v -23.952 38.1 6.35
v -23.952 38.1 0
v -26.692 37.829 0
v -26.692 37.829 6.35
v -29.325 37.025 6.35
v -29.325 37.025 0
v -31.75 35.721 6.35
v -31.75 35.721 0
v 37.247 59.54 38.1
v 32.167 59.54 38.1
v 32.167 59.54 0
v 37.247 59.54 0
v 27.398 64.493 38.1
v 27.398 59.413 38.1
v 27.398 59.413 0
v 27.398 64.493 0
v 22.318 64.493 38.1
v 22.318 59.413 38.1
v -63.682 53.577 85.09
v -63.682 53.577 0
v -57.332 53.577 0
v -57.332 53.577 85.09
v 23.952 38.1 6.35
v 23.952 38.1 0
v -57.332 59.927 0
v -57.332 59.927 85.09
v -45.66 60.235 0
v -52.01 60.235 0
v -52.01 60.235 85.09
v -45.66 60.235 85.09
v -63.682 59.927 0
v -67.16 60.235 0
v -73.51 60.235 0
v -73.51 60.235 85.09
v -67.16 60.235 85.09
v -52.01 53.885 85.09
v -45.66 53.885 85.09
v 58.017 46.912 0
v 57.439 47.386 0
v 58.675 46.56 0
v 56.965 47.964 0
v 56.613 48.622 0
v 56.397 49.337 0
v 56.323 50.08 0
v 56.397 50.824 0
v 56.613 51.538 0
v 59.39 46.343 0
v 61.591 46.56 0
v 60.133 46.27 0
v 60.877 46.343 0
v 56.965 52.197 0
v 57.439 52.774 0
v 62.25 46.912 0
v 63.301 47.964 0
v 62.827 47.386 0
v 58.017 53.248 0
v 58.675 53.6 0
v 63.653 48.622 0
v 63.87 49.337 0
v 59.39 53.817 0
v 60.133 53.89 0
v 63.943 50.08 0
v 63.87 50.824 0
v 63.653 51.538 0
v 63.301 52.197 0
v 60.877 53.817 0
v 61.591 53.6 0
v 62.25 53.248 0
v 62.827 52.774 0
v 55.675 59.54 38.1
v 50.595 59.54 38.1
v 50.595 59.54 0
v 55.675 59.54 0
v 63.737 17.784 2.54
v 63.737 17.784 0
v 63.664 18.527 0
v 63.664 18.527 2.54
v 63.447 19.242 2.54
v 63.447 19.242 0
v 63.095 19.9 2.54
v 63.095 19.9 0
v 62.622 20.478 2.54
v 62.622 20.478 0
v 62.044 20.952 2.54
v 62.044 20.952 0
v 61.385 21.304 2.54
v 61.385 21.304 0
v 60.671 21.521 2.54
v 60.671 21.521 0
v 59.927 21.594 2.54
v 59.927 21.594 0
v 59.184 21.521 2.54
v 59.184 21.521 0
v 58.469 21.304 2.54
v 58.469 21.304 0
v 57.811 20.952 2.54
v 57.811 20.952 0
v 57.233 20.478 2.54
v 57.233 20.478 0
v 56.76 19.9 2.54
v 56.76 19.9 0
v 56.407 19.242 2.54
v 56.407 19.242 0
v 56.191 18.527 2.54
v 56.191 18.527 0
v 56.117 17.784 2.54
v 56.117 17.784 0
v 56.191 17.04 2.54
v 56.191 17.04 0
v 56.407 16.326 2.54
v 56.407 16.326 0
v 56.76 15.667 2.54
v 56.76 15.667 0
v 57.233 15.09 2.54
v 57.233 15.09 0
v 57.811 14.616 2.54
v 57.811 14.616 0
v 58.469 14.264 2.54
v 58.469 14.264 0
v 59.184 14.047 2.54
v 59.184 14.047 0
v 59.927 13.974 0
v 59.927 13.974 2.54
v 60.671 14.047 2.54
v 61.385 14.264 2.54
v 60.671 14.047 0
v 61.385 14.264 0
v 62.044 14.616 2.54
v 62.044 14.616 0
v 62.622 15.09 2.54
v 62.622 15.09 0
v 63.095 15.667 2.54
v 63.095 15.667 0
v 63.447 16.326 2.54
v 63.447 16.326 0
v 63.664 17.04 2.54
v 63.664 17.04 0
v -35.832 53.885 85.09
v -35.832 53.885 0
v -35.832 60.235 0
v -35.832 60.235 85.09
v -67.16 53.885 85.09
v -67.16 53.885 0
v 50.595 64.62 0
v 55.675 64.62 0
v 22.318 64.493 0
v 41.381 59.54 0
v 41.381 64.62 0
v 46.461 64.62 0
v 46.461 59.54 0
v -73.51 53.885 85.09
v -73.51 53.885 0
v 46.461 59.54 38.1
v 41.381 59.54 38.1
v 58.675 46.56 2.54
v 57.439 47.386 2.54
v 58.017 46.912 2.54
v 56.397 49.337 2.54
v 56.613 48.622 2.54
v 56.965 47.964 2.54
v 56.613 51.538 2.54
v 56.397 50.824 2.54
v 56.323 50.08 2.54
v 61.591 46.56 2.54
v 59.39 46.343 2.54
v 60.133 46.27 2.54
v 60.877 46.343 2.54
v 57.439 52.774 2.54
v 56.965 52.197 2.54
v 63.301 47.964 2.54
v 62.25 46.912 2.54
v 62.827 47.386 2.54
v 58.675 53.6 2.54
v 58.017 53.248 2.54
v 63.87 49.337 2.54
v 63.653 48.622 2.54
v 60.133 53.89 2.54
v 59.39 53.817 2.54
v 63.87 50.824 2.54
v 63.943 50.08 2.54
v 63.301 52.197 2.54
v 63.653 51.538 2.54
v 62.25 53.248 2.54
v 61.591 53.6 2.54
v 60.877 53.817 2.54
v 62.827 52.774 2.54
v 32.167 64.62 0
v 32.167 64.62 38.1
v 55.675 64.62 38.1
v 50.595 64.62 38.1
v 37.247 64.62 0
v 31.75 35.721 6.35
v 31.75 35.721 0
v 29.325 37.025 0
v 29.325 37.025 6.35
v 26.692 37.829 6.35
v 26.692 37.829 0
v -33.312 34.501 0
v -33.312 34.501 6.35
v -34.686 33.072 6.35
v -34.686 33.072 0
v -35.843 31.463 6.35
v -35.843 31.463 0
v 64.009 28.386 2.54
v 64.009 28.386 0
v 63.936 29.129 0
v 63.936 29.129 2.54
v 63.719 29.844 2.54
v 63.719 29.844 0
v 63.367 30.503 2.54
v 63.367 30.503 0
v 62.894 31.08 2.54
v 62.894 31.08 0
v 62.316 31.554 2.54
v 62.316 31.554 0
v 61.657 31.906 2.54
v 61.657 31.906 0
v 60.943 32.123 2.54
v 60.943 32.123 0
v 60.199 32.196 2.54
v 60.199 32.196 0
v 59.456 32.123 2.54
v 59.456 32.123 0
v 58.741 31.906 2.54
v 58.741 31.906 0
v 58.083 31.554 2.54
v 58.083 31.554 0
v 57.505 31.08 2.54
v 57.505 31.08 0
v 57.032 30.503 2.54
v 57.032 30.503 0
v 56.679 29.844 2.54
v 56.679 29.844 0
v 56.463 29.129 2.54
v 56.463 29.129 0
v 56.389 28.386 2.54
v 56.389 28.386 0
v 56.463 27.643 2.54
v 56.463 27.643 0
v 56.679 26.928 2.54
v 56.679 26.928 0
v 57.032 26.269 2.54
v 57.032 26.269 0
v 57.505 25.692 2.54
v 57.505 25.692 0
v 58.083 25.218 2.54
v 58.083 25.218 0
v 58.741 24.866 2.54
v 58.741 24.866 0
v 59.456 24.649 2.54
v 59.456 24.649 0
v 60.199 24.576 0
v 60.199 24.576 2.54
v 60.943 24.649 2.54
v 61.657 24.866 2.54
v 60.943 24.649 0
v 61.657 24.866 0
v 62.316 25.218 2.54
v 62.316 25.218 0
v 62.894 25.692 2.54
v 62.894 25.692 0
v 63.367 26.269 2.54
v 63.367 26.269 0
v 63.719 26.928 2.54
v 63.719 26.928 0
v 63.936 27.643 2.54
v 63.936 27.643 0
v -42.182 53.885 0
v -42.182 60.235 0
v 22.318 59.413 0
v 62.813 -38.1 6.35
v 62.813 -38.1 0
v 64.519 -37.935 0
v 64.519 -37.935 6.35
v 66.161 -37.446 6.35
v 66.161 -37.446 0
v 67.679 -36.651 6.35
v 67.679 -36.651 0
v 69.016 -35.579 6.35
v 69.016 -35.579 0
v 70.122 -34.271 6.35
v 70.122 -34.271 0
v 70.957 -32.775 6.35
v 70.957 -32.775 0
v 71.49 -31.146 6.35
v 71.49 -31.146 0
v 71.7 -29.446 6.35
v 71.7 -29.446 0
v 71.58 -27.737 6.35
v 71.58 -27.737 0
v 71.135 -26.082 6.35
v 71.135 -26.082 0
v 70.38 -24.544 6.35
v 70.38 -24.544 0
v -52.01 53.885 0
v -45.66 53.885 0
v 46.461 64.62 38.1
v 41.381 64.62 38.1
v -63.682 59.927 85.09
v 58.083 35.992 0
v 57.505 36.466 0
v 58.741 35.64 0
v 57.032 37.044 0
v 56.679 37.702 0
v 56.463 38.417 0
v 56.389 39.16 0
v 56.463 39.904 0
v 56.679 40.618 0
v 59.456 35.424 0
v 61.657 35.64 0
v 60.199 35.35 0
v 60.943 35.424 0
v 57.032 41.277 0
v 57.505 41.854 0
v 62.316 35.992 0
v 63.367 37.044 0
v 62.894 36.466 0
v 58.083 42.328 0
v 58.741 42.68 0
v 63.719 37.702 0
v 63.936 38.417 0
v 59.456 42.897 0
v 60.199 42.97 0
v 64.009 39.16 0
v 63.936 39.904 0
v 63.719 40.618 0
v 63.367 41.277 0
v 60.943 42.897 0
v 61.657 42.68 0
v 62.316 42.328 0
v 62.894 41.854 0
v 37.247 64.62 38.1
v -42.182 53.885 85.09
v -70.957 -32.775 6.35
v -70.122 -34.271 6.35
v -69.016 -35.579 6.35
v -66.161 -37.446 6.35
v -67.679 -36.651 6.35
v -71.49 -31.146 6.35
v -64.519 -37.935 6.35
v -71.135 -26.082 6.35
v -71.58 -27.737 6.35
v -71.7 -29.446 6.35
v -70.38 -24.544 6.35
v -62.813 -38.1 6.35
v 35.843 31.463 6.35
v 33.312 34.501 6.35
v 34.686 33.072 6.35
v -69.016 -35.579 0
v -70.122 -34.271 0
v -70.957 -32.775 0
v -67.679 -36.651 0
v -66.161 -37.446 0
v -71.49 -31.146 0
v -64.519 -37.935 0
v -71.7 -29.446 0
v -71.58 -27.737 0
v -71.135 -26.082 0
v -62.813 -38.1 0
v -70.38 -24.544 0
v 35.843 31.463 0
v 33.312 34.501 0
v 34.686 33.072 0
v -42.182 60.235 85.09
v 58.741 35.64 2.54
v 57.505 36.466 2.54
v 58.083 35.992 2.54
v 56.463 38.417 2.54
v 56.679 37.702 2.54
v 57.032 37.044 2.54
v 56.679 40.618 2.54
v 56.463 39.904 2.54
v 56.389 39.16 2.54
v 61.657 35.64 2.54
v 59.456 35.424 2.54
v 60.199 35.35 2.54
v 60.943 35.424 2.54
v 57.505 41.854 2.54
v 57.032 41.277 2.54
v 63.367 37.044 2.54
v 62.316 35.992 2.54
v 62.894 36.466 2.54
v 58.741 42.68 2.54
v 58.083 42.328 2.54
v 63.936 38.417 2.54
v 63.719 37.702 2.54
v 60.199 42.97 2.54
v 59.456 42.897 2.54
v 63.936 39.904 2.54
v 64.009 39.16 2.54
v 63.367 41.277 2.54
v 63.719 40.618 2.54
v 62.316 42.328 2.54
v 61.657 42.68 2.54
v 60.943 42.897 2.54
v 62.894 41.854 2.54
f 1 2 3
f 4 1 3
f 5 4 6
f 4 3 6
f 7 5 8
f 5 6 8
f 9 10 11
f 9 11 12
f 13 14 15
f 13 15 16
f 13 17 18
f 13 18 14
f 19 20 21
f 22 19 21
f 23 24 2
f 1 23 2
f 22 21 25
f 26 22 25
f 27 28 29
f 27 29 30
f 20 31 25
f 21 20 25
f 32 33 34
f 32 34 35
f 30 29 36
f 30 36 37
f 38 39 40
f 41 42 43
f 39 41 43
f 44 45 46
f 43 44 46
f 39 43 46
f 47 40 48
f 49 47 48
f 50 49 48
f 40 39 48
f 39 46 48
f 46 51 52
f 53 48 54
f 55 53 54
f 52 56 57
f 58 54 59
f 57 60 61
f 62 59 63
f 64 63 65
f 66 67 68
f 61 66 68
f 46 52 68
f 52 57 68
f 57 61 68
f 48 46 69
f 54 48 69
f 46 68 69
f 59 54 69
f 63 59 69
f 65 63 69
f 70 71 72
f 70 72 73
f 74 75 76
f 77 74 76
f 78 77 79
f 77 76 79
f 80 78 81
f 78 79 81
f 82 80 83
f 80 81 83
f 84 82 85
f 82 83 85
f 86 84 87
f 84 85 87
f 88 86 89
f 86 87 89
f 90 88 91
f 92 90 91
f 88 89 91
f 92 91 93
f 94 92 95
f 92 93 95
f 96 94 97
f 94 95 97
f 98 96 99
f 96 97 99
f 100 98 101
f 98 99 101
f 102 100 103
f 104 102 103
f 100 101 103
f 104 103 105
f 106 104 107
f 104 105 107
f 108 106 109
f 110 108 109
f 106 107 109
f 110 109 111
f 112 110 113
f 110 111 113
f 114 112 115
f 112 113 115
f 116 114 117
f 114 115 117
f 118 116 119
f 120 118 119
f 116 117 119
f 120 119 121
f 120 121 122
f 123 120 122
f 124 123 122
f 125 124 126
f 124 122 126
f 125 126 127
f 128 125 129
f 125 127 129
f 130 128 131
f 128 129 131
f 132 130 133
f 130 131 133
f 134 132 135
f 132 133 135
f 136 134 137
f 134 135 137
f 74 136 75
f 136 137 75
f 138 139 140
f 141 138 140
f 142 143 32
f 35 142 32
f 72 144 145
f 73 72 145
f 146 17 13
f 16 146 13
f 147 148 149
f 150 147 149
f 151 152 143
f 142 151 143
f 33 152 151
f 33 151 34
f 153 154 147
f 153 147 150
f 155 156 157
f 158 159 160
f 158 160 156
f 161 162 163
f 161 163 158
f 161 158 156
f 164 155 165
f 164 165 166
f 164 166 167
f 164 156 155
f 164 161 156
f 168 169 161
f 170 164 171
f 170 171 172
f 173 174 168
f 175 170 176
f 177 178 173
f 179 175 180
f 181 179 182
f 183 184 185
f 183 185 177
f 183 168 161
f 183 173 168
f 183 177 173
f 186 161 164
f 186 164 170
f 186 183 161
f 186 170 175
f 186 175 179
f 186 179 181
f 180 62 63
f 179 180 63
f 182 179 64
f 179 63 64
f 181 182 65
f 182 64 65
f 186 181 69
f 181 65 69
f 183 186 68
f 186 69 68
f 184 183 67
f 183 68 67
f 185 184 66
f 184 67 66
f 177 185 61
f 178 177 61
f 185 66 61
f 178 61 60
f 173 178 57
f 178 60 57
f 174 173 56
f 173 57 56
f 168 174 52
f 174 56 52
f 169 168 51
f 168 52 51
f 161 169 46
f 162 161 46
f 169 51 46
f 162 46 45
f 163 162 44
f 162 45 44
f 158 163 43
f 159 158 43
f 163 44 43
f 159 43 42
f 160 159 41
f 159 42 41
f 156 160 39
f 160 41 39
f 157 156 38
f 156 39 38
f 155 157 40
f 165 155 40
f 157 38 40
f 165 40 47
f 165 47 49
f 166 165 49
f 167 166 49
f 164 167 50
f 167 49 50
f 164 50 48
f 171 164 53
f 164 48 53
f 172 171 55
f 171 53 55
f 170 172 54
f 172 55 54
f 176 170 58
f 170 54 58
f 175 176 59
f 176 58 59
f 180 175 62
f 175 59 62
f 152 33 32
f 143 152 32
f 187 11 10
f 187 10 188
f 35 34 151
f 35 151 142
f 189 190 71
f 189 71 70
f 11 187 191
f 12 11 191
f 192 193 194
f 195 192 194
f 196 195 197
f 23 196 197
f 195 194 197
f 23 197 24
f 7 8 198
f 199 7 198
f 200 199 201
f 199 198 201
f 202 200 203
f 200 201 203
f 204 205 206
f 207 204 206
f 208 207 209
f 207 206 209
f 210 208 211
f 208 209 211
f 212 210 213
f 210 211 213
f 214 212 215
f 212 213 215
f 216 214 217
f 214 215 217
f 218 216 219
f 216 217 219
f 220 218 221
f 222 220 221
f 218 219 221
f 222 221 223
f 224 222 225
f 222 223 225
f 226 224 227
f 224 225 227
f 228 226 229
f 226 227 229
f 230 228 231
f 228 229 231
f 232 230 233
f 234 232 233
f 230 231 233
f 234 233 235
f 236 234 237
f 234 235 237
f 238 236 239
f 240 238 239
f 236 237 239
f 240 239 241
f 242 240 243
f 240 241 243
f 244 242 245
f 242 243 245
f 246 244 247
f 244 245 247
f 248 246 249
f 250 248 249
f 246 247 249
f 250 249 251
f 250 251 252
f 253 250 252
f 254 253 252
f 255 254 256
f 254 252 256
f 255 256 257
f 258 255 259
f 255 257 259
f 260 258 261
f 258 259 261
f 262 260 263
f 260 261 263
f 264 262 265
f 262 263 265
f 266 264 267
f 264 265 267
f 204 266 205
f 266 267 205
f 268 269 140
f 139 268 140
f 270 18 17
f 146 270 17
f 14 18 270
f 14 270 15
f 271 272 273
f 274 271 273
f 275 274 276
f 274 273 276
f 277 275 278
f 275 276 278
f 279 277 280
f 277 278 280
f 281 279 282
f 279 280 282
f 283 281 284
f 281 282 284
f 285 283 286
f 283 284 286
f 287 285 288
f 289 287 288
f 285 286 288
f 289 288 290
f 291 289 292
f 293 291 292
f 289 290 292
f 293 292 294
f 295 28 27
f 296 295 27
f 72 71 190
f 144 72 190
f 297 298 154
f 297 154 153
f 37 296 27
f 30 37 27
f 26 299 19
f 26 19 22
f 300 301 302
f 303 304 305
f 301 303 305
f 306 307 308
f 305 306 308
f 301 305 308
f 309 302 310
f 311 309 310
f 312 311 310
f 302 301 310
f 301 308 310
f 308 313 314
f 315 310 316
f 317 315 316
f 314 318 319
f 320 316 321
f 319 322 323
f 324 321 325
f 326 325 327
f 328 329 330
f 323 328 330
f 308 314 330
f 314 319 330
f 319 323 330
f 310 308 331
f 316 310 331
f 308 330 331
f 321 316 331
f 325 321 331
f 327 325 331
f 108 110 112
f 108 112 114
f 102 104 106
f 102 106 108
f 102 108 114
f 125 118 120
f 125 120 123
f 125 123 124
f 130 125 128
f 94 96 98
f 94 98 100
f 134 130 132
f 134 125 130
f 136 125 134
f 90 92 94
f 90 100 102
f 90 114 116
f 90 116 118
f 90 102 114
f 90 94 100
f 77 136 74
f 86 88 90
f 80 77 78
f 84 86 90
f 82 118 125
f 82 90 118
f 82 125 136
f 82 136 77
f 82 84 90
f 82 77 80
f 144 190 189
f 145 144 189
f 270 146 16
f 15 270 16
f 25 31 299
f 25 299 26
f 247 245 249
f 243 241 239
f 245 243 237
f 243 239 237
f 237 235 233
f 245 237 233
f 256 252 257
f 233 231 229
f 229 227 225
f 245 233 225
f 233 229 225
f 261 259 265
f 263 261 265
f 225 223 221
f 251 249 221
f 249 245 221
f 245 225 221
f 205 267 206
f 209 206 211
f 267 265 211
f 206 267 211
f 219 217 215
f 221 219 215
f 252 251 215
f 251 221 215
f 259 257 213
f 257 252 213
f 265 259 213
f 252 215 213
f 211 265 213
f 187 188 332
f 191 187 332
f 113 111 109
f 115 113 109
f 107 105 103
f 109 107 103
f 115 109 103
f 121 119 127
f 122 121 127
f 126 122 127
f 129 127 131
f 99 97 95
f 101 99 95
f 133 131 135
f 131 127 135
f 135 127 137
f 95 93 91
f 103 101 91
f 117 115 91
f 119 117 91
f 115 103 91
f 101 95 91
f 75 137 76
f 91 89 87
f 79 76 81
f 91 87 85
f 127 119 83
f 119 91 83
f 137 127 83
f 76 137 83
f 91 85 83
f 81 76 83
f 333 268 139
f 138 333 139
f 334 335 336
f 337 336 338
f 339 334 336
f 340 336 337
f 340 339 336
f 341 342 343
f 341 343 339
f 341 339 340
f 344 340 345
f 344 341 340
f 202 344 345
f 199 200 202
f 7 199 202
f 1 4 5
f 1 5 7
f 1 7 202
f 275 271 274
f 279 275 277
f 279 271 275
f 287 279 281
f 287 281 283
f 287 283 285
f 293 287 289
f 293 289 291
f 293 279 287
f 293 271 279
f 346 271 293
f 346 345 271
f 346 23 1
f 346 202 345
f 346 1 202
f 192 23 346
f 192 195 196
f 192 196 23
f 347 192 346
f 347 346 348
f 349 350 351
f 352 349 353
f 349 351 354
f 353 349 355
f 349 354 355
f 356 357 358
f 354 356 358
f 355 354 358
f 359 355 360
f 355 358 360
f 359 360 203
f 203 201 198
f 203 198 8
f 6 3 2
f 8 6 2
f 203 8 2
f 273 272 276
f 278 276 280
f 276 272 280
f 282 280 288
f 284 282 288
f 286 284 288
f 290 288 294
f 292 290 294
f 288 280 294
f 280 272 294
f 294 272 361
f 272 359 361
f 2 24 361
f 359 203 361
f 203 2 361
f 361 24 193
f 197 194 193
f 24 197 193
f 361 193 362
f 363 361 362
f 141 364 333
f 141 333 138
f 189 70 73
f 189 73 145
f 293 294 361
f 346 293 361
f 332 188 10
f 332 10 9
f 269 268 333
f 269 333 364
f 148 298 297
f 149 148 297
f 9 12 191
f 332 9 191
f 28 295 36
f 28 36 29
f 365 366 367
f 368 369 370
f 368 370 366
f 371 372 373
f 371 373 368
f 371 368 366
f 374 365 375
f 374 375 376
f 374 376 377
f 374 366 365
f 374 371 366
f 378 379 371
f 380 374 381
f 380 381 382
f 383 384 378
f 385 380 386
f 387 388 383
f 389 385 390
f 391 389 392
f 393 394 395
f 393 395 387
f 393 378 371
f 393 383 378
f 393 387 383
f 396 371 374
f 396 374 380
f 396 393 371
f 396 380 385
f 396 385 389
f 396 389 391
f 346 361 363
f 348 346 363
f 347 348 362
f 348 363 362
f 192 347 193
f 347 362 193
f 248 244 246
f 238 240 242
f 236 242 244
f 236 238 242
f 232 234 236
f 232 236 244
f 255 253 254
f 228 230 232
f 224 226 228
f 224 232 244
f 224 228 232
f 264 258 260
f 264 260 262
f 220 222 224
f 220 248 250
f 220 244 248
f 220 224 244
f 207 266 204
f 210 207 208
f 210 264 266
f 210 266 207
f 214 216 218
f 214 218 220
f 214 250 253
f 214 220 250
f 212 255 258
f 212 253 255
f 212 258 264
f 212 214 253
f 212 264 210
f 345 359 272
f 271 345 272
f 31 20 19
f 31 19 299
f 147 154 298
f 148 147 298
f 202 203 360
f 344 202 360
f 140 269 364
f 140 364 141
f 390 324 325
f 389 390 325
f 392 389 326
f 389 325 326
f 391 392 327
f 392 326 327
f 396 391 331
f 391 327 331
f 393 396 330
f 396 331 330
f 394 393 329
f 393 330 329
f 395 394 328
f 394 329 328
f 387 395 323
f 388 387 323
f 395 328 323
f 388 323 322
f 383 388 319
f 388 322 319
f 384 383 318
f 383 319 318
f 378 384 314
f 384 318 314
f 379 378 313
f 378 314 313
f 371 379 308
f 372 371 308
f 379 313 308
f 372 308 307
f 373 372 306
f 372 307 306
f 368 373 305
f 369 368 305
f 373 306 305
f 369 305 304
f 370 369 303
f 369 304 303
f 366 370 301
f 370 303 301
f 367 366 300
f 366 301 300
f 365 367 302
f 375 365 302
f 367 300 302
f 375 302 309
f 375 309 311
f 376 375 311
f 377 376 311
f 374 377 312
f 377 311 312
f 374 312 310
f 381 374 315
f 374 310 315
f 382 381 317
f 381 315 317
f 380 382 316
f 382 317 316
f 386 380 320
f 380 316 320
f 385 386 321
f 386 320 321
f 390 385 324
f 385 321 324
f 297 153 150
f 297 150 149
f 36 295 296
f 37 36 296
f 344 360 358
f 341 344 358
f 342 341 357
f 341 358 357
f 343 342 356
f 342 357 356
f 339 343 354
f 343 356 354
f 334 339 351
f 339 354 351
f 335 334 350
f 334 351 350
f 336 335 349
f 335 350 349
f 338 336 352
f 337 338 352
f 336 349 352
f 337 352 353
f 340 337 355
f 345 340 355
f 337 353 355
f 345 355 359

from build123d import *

# Parameters (mm, degrees)
F1_DEPTH = 6.35
F2_W     = 6.35
F2_H     = 6.35
F3_DEPTH = 85.09
F4_W     = 5.08
F4_H     = 5.08
F5_DEPTH = 38.1
F6_R     = 3.81
F7_DEPTH = 2.54


with BuildPart() as f1:
    # F0 (on Top) → F1 (new body)
    with BuildSketch(Plane.XY):
        with BuildLine():
            Line((-31.75, -38.1), (-31.75, 35.721134))
            ThreePointArc((-31.75, 35.721134), (-34.024133, 33.810703), (-35.843005, 31.462695))
            Line((-35.843005, 31.462695), (-70.380306, -24.543739))
            ThreePointArc((-70.380306, -24.543739), (-70.575972, -33.542958), (-62.813397, -38.1))
            Line((-62.813397, -38.1), (-31.75, -38.1))
        make_face()
        with BuildLine():
            Line((23.952148, 38.1), (-23.952148, 38.1))
            ThreePointArc((-23.952148, 38.1), (-28.028467, 37.492055), (-31.75, 35.721134))
            Line((-31.75, 35.721134), (-31.75, -38.1))
            Line((-31.75, -38.1), (31.75, -38.1))
            Line((31.75, -38.1), (31.75, 35.721134))
            ThreePointArc((31.75, 35.721134), (28.028467, 37.492055), (23.952148, 38.1))
        make_face()
        with BuildLine():
            ThreePointArc((35.843005, 31.462695), (34.024133, 33.810703), (31.75, 35.721134))
            Line((31.75, 35.721134), (31.75, -38.1))
            Line((31.75, -38.1), (62.813397, -38.1))
            ThreePointArc((62.813397, -38.1), (70.575972, -33.542958), (70.380306, -24.543739))
            Line((70.380306, -24.543739), (35.843005, 31.462695))
        make_face()
    extrude(amount=F1_DEPTH)


with BuildPart() as f3:
    # F2 (on Top) → F3 (new body)
    with BuildSketch(Plane.XY):
        with Locations((-60.506605, 56.752465)):
            Rectangle(F2_W, F2_H)
        with Locations((-70.335092, 57.059608)):
            Rectangle(F2_W, F2_H)
        with Locations((-48.835281, 57.059608)):
            Rectangle(F2_W, F2_H)
        with Locations((-39.006799, 57.059604)):
            Rectangle(F2_W, F2_H)
    extrude(amount=F3_DEPTH)


with BuildPart() as f5:
    # F4 (on Top) → F5 (new body)
    with BuildSketch(Plane.XY):
        with Locations((34.706831, 62.079684)):
            Rectangle(F4_W, F4_H)
        with Locations((24.857627, 61.953129)):
            Rectangle(F4_W, F4_H)
        with Locations((43.921046, 62.079688)):
            Rectangle(F4_W, F4_H)
        with Locations((53.135239, 62.07968)):
            Rectangle(F4_W, F4_H)
    extrude(amount=F5_DEPTH)


with BuildPart() as f7:
    # F6 (on Top) → F7 (new body)
    with BuildSketch(Plane.XY):
        with Locations((60.133377, 50.080232)):
            Circle(F6_R)
        with Locations((60.199466, 39.160367)):
            Circle(F6_R)
        with Locations((60.199466, 28.386087)):
            Circle(F6_R)
        with Locations((59.927428, 17.783714)):
            Circle(F6_R)
    extrude(amount=F7_DEPTH)


solid = Compound([f1.part, f3.part, f5.part, f7.part])
